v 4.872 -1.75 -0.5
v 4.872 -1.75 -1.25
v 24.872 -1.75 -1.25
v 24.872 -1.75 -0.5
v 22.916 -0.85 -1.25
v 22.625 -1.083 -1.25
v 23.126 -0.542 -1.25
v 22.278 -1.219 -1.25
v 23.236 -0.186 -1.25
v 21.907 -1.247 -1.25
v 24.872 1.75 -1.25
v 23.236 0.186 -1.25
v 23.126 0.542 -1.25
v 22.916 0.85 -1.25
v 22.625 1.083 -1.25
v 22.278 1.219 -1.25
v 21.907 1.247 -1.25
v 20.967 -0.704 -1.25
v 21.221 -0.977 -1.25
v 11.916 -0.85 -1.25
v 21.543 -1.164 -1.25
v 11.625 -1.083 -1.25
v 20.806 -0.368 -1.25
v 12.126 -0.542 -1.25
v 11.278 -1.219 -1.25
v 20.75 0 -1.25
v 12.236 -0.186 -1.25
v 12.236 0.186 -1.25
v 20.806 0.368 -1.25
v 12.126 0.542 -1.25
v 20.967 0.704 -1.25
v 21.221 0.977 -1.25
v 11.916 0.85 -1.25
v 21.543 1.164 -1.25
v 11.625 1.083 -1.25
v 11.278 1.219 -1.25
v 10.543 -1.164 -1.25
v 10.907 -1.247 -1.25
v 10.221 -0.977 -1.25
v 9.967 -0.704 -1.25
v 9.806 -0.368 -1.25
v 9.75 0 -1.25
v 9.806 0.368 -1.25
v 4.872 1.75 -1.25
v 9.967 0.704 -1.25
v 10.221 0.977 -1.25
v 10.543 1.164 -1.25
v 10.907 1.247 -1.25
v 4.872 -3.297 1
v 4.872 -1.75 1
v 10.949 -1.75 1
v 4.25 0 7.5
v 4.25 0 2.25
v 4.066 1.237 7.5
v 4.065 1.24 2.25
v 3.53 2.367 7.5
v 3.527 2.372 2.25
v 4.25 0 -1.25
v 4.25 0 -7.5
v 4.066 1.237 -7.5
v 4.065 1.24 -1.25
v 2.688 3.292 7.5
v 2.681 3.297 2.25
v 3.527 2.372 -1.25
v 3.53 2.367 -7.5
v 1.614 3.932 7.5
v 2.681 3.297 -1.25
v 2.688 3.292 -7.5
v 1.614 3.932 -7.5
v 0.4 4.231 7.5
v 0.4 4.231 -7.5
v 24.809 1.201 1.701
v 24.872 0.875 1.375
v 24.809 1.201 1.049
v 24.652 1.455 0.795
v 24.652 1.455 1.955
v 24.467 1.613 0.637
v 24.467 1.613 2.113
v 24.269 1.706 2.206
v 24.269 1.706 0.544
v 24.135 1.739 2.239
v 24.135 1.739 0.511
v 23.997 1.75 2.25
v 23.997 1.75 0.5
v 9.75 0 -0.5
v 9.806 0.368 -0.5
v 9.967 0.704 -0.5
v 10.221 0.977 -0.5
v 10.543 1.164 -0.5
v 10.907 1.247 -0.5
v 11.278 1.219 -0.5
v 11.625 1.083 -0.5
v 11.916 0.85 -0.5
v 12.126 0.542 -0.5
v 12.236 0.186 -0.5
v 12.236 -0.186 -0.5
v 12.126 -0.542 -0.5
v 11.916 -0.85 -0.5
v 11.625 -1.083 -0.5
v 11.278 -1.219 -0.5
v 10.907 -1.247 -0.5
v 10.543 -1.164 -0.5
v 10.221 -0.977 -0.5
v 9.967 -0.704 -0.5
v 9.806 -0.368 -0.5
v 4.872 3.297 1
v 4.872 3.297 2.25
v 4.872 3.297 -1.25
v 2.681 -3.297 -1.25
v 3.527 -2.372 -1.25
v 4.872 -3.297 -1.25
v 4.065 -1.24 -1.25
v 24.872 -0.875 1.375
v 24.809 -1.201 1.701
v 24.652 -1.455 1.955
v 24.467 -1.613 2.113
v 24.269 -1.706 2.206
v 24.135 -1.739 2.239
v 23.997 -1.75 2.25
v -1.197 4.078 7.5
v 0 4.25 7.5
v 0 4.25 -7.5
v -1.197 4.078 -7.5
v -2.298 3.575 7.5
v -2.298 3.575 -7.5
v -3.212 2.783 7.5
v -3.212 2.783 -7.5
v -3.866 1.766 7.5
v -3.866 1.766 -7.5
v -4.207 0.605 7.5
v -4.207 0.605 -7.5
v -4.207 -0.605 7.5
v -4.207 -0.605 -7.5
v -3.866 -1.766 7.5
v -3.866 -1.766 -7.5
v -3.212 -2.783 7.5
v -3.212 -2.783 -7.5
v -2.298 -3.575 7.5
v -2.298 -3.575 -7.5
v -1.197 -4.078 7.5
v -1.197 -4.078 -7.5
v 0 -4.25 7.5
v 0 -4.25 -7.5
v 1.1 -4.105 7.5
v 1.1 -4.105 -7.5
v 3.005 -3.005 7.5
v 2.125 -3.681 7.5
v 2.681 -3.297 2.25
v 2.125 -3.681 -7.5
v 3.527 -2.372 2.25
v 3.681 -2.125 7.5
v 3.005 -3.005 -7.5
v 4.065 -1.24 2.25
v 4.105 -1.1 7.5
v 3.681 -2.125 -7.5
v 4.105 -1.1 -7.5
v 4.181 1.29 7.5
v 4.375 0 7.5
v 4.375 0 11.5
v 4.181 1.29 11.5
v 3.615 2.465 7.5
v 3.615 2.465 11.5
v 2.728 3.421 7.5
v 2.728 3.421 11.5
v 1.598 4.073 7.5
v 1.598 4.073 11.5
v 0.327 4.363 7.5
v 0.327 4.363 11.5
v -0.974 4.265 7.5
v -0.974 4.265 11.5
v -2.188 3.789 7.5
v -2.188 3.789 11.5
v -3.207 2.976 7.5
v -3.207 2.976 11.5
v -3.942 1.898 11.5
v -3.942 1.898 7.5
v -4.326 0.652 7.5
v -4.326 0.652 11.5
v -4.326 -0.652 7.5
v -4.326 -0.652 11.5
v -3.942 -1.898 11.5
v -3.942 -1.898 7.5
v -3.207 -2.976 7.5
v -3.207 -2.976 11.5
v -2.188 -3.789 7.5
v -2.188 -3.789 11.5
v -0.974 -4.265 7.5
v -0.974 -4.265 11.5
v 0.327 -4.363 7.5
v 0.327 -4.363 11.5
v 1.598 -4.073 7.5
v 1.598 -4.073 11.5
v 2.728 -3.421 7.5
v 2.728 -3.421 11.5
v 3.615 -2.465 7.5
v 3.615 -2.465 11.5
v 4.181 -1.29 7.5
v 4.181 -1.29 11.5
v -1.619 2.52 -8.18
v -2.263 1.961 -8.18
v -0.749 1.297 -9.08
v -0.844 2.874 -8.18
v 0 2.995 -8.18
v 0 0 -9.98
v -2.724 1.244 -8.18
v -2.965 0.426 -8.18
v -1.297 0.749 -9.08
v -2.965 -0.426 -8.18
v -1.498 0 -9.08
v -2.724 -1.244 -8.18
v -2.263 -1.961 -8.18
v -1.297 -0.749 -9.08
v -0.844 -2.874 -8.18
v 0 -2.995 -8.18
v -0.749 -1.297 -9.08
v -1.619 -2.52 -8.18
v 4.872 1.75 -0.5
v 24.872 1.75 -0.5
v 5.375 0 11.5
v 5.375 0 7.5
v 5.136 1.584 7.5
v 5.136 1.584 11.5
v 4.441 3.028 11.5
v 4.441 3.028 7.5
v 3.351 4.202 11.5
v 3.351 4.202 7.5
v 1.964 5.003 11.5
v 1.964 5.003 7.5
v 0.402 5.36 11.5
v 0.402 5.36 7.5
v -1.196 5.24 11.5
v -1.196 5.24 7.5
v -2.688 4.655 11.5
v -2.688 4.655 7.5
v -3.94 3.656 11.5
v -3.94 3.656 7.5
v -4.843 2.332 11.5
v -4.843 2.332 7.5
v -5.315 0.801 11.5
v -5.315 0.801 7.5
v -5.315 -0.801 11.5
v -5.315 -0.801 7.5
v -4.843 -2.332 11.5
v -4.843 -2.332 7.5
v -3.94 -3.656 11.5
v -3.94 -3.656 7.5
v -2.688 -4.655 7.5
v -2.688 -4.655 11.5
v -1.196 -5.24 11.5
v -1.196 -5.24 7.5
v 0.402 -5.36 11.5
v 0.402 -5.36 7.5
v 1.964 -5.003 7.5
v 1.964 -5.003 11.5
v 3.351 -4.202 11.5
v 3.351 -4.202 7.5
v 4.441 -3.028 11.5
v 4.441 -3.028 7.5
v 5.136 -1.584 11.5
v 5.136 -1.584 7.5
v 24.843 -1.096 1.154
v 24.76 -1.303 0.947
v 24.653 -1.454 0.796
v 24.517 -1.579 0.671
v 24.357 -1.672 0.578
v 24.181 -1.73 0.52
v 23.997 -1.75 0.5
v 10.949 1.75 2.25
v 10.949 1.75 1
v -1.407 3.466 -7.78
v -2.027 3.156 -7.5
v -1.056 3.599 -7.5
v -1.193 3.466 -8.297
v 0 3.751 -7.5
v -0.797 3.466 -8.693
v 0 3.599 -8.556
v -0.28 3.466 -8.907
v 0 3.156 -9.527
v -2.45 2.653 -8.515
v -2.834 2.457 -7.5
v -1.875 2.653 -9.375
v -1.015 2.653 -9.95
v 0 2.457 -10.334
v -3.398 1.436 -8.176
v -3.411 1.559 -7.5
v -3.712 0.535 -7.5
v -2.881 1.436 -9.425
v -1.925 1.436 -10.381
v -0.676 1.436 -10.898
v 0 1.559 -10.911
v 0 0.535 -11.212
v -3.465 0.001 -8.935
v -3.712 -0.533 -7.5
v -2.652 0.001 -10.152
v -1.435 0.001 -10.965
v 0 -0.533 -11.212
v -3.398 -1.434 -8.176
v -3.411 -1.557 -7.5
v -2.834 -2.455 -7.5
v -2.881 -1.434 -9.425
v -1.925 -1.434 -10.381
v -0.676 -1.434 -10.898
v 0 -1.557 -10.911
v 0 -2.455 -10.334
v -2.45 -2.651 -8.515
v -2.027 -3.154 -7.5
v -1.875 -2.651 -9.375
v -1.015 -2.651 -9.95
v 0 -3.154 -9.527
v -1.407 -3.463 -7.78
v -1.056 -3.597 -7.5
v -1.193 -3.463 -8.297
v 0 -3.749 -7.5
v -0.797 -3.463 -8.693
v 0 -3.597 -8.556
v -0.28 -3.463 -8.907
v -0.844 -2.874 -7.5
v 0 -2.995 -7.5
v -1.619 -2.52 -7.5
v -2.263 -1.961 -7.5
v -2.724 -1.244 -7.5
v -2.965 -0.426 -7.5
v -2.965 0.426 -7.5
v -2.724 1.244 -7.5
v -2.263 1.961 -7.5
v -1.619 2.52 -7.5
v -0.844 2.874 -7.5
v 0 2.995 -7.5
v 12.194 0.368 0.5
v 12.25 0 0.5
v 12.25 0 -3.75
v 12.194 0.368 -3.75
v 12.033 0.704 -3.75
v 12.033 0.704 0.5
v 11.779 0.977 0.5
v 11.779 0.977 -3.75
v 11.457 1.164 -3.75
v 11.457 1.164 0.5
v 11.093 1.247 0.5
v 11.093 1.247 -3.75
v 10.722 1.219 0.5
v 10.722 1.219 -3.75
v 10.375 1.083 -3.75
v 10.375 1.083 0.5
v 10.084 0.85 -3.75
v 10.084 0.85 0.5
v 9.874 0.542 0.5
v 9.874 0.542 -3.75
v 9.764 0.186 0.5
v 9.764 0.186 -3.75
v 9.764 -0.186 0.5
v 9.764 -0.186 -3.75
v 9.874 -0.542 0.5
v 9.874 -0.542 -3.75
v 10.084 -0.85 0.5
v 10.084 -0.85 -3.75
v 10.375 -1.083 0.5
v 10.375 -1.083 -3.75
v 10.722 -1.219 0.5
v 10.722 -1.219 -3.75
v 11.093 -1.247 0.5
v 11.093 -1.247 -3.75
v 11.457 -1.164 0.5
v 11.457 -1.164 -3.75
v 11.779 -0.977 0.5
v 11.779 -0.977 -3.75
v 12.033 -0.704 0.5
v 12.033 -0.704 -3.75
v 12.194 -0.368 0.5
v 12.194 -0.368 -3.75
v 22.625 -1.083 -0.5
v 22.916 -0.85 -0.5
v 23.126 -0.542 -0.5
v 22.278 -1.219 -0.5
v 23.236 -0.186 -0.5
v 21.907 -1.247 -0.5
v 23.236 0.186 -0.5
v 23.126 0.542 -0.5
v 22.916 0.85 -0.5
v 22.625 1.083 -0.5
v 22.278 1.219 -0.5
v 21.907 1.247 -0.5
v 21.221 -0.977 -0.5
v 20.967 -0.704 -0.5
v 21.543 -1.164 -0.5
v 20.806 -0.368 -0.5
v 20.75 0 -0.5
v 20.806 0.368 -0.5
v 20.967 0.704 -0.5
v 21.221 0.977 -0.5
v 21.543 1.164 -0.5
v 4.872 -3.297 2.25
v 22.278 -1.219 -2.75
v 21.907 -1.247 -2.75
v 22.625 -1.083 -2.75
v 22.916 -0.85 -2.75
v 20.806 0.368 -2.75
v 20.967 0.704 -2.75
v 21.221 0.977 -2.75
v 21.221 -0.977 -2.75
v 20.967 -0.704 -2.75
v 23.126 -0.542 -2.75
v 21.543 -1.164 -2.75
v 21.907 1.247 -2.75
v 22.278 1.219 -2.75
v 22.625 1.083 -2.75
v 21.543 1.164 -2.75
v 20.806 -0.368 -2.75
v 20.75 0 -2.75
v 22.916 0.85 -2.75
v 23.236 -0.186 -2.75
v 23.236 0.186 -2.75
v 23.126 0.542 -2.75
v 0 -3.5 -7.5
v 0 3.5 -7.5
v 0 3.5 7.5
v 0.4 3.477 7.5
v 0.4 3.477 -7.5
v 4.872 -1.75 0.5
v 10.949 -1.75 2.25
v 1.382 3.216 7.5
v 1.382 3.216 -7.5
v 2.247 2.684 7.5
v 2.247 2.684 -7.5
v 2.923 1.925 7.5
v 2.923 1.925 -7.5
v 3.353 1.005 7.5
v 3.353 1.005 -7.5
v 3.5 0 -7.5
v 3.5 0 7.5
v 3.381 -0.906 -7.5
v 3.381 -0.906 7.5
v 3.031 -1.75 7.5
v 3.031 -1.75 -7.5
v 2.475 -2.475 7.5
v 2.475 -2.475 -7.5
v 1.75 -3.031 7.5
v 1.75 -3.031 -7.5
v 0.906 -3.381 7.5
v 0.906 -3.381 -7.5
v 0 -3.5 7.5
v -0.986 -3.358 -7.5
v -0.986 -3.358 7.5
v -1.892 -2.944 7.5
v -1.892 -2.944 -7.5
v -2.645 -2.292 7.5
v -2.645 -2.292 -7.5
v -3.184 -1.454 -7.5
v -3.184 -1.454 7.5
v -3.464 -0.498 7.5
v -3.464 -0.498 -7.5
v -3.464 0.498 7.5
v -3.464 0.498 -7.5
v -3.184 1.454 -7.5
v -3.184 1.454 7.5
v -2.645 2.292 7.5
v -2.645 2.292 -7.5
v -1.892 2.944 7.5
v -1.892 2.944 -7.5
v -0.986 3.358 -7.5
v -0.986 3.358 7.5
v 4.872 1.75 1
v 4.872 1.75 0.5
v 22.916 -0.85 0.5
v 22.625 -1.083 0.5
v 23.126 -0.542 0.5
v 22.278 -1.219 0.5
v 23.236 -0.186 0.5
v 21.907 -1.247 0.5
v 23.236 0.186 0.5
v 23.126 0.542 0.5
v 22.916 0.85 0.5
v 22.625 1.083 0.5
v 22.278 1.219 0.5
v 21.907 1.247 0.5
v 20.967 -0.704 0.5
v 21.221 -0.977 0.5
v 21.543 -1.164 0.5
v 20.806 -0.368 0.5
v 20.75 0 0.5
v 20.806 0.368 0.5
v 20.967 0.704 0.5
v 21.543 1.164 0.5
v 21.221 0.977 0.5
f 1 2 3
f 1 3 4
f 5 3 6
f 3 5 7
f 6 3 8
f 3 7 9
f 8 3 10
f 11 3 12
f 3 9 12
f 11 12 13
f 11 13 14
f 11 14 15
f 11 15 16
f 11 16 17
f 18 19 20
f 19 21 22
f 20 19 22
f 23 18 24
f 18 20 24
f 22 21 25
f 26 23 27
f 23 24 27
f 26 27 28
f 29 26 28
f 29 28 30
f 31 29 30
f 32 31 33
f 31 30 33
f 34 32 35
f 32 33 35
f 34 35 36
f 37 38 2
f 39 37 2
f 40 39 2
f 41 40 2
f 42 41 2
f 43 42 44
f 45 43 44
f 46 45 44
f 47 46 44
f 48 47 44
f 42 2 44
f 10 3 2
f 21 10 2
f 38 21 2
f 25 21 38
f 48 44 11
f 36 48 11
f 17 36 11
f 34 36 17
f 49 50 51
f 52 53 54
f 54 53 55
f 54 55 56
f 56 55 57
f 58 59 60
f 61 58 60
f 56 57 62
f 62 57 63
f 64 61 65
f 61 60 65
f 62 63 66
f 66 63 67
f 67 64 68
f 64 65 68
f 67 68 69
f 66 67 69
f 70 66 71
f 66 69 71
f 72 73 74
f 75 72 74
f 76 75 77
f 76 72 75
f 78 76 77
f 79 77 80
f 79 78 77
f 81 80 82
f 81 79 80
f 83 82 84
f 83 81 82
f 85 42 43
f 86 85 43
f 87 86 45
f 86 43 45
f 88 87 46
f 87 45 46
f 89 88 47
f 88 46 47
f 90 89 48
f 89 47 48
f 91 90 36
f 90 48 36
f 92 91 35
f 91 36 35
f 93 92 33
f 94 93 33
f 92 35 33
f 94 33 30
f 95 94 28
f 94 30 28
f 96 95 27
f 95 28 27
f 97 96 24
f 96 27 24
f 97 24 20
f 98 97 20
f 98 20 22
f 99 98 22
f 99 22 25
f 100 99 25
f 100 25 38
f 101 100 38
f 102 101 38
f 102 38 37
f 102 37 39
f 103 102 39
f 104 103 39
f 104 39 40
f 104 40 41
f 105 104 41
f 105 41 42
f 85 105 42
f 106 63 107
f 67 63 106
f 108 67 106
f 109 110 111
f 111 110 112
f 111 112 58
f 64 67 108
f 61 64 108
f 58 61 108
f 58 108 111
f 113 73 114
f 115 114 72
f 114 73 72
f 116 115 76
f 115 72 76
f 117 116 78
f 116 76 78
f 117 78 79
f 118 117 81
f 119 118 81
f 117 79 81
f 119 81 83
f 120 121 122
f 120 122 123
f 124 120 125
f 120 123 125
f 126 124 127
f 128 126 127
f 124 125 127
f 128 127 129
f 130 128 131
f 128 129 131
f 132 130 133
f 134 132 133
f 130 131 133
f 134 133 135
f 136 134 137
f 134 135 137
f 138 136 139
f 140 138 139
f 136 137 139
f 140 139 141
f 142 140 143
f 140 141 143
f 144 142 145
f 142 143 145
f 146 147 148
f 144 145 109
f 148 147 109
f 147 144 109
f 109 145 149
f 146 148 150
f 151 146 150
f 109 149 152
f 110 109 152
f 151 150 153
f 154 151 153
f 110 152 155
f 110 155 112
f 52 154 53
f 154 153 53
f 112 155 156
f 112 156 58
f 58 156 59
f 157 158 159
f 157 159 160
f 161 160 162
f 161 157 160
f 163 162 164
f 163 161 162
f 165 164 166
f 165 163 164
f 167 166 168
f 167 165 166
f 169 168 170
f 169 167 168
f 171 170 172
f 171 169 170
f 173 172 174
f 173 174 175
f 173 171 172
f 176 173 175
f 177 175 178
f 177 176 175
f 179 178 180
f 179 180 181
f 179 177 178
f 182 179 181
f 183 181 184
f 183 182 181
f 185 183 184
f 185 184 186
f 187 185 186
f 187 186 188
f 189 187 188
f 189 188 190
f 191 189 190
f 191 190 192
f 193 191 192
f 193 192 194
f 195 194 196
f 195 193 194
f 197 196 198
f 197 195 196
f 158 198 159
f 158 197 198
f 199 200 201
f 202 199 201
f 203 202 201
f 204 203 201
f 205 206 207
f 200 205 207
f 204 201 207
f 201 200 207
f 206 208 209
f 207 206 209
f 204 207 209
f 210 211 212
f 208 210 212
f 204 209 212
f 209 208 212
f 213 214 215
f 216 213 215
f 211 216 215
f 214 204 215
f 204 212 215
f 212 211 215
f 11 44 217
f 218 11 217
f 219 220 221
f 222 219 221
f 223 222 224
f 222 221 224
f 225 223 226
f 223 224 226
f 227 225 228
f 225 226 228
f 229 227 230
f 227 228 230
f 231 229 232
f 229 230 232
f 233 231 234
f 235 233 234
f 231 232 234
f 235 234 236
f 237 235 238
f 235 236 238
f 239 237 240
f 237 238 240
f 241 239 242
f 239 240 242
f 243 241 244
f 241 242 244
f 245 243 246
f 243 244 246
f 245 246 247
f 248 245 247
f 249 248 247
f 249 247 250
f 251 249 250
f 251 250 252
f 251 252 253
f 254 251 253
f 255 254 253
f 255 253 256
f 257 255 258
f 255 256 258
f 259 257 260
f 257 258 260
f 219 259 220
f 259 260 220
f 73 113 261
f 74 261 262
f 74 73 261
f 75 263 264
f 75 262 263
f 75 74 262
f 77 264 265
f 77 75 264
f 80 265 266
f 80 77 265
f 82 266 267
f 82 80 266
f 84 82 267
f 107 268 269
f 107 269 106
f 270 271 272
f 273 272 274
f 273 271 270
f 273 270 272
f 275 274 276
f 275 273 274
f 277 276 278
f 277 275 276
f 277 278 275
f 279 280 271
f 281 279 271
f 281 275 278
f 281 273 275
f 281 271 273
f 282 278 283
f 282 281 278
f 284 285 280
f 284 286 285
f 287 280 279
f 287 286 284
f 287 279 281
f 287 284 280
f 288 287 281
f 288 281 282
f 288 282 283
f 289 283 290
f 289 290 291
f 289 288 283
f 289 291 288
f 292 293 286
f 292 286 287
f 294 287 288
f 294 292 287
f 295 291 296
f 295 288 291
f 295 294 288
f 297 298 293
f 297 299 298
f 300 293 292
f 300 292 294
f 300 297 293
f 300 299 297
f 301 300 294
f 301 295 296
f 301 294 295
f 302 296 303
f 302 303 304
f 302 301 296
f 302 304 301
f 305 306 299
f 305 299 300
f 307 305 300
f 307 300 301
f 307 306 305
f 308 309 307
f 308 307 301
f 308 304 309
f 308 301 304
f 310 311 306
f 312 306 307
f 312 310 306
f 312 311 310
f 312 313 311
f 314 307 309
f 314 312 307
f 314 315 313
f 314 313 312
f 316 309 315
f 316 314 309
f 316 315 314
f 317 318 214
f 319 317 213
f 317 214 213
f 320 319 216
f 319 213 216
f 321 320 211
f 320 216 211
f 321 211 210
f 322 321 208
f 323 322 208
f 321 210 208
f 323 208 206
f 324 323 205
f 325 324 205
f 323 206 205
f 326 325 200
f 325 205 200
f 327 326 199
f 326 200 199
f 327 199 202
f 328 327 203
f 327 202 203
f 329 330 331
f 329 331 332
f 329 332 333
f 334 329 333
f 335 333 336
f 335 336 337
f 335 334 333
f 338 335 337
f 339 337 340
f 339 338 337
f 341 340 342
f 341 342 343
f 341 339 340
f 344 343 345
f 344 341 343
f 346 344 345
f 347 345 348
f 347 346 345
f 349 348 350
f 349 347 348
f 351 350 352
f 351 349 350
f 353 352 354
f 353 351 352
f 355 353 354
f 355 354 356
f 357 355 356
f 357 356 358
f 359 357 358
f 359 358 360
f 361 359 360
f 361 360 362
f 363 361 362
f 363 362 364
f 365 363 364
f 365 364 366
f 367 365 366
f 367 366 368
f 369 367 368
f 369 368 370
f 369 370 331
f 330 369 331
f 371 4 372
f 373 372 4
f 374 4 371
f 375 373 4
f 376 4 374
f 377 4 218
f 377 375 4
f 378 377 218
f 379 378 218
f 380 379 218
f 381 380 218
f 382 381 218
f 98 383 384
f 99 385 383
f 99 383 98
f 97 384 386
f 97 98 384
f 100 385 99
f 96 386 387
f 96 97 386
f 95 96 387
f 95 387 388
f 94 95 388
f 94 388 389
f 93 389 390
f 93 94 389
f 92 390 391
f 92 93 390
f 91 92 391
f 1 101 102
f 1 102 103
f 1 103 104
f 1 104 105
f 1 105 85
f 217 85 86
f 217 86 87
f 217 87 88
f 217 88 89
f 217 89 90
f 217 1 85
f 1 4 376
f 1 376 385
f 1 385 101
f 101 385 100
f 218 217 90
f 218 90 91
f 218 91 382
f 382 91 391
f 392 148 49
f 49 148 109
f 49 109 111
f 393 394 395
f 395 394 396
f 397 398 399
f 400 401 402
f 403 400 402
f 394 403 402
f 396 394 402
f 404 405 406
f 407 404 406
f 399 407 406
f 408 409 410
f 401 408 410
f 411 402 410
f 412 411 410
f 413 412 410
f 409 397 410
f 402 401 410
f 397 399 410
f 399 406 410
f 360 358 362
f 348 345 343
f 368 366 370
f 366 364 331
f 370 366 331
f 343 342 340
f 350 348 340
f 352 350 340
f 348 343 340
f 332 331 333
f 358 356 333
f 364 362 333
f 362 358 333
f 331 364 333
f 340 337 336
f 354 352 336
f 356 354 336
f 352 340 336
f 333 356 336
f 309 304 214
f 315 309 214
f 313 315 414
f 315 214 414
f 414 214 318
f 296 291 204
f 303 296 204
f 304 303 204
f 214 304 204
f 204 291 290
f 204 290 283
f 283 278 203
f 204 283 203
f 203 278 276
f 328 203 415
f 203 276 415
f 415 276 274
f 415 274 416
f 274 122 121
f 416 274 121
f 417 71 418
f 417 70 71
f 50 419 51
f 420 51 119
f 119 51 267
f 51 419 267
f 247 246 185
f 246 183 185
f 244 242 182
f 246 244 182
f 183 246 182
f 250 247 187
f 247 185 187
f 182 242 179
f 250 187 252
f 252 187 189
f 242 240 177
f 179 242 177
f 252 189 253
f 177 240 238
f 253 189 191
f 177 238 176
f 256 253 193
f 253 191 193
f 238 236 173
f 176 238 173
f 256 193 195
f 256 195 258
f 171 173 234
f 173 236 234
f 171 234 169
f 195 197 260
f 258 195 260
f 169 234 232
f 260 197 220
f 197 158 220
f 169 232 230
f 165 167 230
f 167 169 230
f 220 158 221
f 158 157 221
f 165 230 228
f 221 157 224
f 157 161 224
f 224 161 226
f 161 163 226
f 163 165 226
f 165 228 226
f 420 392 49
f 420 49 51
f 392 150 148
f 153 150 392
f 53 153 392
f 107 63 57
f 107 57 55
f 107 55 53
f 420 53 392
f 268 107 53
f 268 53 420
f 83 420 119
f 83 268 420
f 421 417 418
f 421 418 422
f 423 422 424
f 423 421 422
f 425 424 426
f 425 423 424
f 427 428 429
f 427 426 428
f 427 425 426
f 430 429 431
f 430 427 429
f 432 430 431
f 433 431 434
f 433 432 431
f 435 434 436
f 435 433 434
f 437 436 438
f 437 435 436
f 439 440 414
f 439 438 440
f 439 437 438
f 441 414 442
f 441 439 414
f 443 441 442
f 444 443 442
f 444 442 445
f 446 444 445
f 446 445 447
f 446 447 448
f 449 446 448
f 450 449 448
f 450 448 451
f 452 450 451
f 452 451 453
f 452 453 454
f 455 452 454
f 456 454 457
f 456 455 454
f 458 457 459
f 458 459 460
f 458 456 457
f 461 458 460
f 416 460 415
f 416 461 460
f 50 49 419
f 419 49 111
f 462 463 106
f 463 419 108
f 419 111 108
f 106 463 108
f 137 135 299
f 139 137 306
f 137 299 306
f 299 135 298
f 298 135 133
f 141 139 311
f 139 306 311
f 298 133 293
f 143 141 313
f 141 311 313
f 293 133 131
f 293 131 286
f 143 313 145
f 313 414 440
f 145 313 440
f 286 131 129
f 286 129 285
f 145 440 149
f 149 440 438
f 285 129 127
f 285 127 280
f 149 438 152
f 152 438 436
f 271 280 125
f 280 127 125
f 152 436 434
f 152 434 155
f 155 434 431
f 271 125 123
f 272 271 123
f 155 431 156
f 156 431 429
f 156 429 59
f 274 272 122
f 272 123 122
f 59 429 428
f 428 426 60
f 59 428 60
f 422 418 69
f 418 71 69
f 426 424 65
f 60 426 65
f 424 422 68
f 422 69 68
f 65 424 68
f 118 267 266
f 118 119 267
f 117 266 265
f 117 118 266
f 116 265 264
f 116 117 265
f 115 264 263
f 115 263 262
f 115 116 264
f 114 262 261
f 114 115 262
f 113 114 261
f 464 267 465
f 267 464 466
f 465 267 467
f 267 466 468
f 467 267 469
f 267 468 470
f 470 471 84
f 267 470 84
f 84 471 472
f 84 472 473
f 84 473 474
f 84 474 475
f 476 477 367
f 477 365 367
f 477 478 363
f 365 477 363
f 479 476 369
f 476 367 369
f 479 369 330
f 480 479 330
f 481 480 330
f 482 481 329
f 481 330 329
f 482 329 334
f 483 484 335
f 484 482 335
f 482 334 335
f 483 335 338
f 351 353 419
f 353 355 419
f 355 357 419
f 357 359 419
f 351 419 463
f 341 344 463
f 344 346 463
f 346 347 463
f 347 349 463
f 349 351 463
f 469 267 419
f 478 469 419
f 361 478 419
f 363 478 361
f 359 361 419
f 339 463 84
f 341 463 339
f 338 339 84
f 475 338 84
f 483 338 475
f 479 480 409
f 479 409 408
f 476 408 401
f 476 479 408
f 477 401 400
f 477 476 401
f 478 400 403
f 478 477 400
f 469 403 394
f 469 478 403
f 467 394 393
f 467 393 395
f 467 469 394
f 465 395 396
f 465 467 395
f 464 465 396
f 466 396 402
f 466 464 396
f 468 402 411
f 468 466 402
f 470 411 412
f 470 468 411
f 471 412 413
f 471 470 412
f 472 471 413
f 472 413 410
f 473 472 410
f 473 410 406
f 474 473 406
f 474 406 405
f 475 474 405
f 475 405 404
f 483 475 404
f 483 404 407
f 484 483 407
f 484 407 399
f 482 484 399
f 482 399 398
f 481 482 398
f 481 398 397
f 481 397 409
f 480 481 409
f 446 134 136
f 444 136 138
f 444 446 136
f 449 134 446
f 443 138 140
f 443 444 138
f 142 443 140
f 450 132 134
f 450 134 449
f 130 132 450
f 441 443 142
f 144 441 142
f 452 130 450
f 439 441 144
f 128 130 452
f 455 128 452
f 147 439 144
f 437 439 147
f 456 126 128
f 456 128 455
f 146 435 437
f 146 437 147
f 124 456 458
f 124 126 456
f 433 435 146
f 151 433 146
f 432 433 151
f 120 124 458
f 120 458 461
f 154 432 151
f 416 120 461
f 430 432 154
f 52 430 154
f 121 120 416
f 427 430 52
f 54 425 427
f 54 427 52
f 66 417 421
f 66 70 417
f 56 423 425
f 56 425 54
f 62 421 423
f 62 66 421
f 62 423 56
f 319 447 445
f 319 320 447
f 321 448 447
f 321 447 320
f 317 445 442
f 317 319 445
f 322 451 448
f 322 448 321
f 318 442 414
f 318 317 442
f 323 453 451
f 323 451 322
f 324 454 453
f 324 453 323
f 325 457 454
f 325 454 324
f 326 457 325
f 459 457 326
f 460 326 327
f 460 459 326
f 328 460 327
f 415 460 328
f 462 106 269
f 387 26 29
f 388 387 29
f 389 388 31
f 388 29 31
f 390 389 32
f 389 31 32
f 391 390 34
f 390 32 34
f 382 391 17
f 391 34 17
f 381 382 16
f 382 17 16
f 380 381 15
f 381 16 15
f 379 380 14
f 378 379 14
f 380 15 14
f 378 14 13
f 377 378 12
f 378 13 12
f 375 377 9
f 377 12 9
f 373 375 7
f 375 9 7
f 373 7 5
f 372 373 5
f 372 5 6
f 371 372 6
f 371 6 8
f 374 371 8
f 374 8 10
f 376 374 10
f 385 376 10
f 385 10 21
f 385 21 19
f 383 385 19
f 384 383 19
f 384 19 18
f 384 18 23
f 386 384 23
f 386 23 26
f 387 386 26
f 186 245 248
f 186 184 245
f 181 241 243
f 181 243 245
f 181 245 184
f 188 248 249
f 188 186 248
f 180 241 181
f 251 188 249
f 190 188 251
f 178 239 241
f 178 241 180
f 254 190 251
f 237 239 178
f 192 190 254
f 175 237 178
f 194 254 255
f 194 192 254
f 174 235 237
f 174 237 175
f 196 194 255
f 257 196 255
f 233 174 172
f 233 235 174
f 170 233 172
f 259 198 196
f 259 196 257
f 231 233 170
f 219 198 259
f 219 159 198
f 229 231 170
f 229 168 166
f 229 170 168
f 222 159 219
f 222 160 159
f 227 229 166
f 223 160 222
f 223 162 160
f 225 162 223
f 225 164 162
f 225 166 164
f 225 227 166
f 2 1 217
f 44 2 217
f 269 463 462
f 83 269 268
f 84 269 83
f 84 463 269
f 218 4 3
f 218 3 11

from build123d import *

# Parameters (mm, degrees)
F1_DEPTH  = 7.5
F4_W      = 4.8718336038
F4_H      = 6.594719131
F5_DEPTH  = 1.25
F9_W      = 3.5
F9_H      = 0.75
F10_DEPTH = 20
F14_DEPTH = 20
F15_D     = 2.5
F15_DEPTH = 5
F15_TIP   = 0.7510757738
F16_DEPTH = 5
F17_DEPTH = 1
F18_DEPTH = 4
F20_DEPTH = 1.25
F21_DEPTH = 25
F22_R     = 5.375
F22_R_2   = 4.375
F23_DEPTH = 4
F24_R     = 0.87499
F25_ANGLE = 90
F26_D     = 5.99
F26_DEPTH = 6
F26_TIP   = 1.799577554


# Not quite as in the source:
# - a fillet or chamfer is up to 0.001 mm smaller than in the source, because OpenCascade refuses the exact size
# - a feature names something its author has since deleted; it is built from what else it names


with BuildPart() as f1:
    # F0 (on Top) → F1 (new body, symmetric)
    with BuildSketch(Plane.XY):
        with BuildLine():
            ThreePointArc((0.4, 3.4770677301), (2.6124700955, 2.3291629398), (3.5, 0))
            ThreePointArc((3.5, 0), (2.4748737342, -2.4748737342), (0, -3.5))
            Line((0, -3.5), (0, -4.25))
            ThreePointArc((0, -4.25), (3.00520382, -3.00520382), (4.25, 0))
            ThreePointArc((4.25, 0), (3.1434455618, 2.860288447), (0.4, 4.2311345996))
            Line((0.4, 4.2311345996), (0.4, 3.4770677301))
        make_face()
        with BuildLine():
            Line((0, -4.25), (0, -3.5))
            ThreePointArc((0, -3.5), (-3.5, 0), (0, 3.5))
            Line((0, 3.5), (0, 4.25))
            ThreePointArc((0, 4.25), (-4.25, 0), (0, -4.25))
        make_face()
    extrude(amount=F1_DEPTH, both=True)

    # F4 (on Top) → F5 (join, symmetric)
    with BuildSketch(Plane.XY):
        with Locations((2.4359168019, 0)):
            Rectangle(F4_W, F4_H)
    extrude(amount=F5_DEPTH, both=True)

    # F9 (on offset) → F10 (join)
    with BuildSketch(Plane.YZ.offset(4.8718336038)):
        with Locations((0, 0.875)):
            Rectangle(F9_W, F9_H)
    extrude(amount=F10_DEPTH)

    # F12 (on offset) → F16 (join)
    with BuildSketch(Plane.XY.offset(1.25)):
        with BuildLine():
            Line((12.25, 0), (11, 0))
            Line((11, 0), (9.75, 0))
            ThreePointArc((9.75, 0), (11, -1.25), (12.25, 0))
        make_face()
        with BuildLine():
            Line((9.75, 0), (11, 0))
            Line((11, 0), (12.25, 0))
            ThreePointArc((12.25, 0), (11, 1.25), (9.75, 0))
        make_face()
    extrude(amount=-F16_DEPTH)

    # F17 (add): a face of the model
    f17_faces = [f1.faces().sort_by_distance(p)[0] for p in [
        (13.8735829145, 0, 1.25),
    ]]
    extrude(f17_faces, amount=F17_DEPTH)

    # F12 (on offset) → F18 (join)
    with BuildSketch(Plane.XY.offset(1.25)):
        with BuildLine():
            ThreePointArc((23.25, 0), (22, 1.25), (20.75, 0))
            ThreePointArc((20.75, 0), (22, -1.25), (23.25, 0))
        make_face()
    extrude(amount=-F18_DEPTH)

    # F19 (on face) → F20 (join)
    with BuildSketch(Plane.XY.offset(2.25)):
        Polygon((10.9490072355, 1.75), (4.8718336038, 3.2973595655), (4.8718336038, 1.75), align=None)
        Polygon((4.8718336038, -1.75), (4.8718336038, -3.2973595655), (10.9490072355, -1.75), align=None)
    extrude(amount=-F20_DEPTH)

    # F21 (cut): a face of the model
    f21_faces = [f1.faces().sort_by_distance(p)[0] for p in [
        (1.5030375026, 0, 1.25),
    ]]
    extrude(f21_faces, amount=-F21_DEPTH, mode=Mode.SUBTRACT)

    # F24 (radius 0.875 in the source; OpenCascade refuses exactly that, so slightly less here)
    f24_edges = [f1.edges().sort_by_distance(p)[0] for p in [
        (24.871834, 0, 2.25),
        (24.871834, -1.75, 1.375),
        (24.871834, 0, 0.5),
        (24.871834, 1.75, 1.375),
    ]]
    fillet(f24_edges, radius=F24_R)

    # F3 (on offset) → F25 (revolve)
    with BuildSketch(Plane.XY.offset(-7.5)):
        with BuildLine():
            Line((0, -3.7489147878), (0, 3.7510852122))
            ThreePointArc((0, 3.7510852122), (-3.75, 0.0010852122), (0, -3.7489147878))
        make_face()
    revolve(axis=Axis((0, 0.0010852122, -7.5), (0, -1, 0)), revolution_arc=F25_ANGLE)

    # F26
    with Locations(Plane.XY.offset(-2.18)):
        with Locations((0, 0)):
            Hole(F26_D / 2, depth=F26_DEPTH)
            with Locations((0, 0, -(F26_DEPTH + F26_TIP / 2))):  # 118° drill point
                Cone(0, F26_D / 2, F26_TIP, mode=Mode.SUBTRACT)


with BuildPart() as f14:
    # F9 (on offset) → F14 (new body)
    with BuildSketch(Plane.YZ.offset(4.8718336038)):
        with Locations((0, -0.875)):
            Rectangle(F9_W, F9_H)
    extrude(amount=F14_DEPTH)

    # F15
    with Locations(Plane.XY.offset(1.25)):
        with Locations((11, 0), (22, 0)):
            Hole(F15_D / 2, depth=F15_DEPTH)
            with Locations((0, 0, -(F15_DEPTH + F15_TIP / 2))):  # 118° drill point
                Cone(0, F15_D / 2, F15_TIP, mode=Mode.SUBTRACT)


with BuildPart() as f23:
    # F22 (on face) → F23 (new body)
    with BuildSketch(Plane.XY.offset(7.5)):
        Circle(F22_R)
        Circle(F22_R_2, mode=Mode.SUBTRACT)
    extrude(amount=F23_DEPTH)


solid = Compound([f1.part, f14.part, f23.part])
